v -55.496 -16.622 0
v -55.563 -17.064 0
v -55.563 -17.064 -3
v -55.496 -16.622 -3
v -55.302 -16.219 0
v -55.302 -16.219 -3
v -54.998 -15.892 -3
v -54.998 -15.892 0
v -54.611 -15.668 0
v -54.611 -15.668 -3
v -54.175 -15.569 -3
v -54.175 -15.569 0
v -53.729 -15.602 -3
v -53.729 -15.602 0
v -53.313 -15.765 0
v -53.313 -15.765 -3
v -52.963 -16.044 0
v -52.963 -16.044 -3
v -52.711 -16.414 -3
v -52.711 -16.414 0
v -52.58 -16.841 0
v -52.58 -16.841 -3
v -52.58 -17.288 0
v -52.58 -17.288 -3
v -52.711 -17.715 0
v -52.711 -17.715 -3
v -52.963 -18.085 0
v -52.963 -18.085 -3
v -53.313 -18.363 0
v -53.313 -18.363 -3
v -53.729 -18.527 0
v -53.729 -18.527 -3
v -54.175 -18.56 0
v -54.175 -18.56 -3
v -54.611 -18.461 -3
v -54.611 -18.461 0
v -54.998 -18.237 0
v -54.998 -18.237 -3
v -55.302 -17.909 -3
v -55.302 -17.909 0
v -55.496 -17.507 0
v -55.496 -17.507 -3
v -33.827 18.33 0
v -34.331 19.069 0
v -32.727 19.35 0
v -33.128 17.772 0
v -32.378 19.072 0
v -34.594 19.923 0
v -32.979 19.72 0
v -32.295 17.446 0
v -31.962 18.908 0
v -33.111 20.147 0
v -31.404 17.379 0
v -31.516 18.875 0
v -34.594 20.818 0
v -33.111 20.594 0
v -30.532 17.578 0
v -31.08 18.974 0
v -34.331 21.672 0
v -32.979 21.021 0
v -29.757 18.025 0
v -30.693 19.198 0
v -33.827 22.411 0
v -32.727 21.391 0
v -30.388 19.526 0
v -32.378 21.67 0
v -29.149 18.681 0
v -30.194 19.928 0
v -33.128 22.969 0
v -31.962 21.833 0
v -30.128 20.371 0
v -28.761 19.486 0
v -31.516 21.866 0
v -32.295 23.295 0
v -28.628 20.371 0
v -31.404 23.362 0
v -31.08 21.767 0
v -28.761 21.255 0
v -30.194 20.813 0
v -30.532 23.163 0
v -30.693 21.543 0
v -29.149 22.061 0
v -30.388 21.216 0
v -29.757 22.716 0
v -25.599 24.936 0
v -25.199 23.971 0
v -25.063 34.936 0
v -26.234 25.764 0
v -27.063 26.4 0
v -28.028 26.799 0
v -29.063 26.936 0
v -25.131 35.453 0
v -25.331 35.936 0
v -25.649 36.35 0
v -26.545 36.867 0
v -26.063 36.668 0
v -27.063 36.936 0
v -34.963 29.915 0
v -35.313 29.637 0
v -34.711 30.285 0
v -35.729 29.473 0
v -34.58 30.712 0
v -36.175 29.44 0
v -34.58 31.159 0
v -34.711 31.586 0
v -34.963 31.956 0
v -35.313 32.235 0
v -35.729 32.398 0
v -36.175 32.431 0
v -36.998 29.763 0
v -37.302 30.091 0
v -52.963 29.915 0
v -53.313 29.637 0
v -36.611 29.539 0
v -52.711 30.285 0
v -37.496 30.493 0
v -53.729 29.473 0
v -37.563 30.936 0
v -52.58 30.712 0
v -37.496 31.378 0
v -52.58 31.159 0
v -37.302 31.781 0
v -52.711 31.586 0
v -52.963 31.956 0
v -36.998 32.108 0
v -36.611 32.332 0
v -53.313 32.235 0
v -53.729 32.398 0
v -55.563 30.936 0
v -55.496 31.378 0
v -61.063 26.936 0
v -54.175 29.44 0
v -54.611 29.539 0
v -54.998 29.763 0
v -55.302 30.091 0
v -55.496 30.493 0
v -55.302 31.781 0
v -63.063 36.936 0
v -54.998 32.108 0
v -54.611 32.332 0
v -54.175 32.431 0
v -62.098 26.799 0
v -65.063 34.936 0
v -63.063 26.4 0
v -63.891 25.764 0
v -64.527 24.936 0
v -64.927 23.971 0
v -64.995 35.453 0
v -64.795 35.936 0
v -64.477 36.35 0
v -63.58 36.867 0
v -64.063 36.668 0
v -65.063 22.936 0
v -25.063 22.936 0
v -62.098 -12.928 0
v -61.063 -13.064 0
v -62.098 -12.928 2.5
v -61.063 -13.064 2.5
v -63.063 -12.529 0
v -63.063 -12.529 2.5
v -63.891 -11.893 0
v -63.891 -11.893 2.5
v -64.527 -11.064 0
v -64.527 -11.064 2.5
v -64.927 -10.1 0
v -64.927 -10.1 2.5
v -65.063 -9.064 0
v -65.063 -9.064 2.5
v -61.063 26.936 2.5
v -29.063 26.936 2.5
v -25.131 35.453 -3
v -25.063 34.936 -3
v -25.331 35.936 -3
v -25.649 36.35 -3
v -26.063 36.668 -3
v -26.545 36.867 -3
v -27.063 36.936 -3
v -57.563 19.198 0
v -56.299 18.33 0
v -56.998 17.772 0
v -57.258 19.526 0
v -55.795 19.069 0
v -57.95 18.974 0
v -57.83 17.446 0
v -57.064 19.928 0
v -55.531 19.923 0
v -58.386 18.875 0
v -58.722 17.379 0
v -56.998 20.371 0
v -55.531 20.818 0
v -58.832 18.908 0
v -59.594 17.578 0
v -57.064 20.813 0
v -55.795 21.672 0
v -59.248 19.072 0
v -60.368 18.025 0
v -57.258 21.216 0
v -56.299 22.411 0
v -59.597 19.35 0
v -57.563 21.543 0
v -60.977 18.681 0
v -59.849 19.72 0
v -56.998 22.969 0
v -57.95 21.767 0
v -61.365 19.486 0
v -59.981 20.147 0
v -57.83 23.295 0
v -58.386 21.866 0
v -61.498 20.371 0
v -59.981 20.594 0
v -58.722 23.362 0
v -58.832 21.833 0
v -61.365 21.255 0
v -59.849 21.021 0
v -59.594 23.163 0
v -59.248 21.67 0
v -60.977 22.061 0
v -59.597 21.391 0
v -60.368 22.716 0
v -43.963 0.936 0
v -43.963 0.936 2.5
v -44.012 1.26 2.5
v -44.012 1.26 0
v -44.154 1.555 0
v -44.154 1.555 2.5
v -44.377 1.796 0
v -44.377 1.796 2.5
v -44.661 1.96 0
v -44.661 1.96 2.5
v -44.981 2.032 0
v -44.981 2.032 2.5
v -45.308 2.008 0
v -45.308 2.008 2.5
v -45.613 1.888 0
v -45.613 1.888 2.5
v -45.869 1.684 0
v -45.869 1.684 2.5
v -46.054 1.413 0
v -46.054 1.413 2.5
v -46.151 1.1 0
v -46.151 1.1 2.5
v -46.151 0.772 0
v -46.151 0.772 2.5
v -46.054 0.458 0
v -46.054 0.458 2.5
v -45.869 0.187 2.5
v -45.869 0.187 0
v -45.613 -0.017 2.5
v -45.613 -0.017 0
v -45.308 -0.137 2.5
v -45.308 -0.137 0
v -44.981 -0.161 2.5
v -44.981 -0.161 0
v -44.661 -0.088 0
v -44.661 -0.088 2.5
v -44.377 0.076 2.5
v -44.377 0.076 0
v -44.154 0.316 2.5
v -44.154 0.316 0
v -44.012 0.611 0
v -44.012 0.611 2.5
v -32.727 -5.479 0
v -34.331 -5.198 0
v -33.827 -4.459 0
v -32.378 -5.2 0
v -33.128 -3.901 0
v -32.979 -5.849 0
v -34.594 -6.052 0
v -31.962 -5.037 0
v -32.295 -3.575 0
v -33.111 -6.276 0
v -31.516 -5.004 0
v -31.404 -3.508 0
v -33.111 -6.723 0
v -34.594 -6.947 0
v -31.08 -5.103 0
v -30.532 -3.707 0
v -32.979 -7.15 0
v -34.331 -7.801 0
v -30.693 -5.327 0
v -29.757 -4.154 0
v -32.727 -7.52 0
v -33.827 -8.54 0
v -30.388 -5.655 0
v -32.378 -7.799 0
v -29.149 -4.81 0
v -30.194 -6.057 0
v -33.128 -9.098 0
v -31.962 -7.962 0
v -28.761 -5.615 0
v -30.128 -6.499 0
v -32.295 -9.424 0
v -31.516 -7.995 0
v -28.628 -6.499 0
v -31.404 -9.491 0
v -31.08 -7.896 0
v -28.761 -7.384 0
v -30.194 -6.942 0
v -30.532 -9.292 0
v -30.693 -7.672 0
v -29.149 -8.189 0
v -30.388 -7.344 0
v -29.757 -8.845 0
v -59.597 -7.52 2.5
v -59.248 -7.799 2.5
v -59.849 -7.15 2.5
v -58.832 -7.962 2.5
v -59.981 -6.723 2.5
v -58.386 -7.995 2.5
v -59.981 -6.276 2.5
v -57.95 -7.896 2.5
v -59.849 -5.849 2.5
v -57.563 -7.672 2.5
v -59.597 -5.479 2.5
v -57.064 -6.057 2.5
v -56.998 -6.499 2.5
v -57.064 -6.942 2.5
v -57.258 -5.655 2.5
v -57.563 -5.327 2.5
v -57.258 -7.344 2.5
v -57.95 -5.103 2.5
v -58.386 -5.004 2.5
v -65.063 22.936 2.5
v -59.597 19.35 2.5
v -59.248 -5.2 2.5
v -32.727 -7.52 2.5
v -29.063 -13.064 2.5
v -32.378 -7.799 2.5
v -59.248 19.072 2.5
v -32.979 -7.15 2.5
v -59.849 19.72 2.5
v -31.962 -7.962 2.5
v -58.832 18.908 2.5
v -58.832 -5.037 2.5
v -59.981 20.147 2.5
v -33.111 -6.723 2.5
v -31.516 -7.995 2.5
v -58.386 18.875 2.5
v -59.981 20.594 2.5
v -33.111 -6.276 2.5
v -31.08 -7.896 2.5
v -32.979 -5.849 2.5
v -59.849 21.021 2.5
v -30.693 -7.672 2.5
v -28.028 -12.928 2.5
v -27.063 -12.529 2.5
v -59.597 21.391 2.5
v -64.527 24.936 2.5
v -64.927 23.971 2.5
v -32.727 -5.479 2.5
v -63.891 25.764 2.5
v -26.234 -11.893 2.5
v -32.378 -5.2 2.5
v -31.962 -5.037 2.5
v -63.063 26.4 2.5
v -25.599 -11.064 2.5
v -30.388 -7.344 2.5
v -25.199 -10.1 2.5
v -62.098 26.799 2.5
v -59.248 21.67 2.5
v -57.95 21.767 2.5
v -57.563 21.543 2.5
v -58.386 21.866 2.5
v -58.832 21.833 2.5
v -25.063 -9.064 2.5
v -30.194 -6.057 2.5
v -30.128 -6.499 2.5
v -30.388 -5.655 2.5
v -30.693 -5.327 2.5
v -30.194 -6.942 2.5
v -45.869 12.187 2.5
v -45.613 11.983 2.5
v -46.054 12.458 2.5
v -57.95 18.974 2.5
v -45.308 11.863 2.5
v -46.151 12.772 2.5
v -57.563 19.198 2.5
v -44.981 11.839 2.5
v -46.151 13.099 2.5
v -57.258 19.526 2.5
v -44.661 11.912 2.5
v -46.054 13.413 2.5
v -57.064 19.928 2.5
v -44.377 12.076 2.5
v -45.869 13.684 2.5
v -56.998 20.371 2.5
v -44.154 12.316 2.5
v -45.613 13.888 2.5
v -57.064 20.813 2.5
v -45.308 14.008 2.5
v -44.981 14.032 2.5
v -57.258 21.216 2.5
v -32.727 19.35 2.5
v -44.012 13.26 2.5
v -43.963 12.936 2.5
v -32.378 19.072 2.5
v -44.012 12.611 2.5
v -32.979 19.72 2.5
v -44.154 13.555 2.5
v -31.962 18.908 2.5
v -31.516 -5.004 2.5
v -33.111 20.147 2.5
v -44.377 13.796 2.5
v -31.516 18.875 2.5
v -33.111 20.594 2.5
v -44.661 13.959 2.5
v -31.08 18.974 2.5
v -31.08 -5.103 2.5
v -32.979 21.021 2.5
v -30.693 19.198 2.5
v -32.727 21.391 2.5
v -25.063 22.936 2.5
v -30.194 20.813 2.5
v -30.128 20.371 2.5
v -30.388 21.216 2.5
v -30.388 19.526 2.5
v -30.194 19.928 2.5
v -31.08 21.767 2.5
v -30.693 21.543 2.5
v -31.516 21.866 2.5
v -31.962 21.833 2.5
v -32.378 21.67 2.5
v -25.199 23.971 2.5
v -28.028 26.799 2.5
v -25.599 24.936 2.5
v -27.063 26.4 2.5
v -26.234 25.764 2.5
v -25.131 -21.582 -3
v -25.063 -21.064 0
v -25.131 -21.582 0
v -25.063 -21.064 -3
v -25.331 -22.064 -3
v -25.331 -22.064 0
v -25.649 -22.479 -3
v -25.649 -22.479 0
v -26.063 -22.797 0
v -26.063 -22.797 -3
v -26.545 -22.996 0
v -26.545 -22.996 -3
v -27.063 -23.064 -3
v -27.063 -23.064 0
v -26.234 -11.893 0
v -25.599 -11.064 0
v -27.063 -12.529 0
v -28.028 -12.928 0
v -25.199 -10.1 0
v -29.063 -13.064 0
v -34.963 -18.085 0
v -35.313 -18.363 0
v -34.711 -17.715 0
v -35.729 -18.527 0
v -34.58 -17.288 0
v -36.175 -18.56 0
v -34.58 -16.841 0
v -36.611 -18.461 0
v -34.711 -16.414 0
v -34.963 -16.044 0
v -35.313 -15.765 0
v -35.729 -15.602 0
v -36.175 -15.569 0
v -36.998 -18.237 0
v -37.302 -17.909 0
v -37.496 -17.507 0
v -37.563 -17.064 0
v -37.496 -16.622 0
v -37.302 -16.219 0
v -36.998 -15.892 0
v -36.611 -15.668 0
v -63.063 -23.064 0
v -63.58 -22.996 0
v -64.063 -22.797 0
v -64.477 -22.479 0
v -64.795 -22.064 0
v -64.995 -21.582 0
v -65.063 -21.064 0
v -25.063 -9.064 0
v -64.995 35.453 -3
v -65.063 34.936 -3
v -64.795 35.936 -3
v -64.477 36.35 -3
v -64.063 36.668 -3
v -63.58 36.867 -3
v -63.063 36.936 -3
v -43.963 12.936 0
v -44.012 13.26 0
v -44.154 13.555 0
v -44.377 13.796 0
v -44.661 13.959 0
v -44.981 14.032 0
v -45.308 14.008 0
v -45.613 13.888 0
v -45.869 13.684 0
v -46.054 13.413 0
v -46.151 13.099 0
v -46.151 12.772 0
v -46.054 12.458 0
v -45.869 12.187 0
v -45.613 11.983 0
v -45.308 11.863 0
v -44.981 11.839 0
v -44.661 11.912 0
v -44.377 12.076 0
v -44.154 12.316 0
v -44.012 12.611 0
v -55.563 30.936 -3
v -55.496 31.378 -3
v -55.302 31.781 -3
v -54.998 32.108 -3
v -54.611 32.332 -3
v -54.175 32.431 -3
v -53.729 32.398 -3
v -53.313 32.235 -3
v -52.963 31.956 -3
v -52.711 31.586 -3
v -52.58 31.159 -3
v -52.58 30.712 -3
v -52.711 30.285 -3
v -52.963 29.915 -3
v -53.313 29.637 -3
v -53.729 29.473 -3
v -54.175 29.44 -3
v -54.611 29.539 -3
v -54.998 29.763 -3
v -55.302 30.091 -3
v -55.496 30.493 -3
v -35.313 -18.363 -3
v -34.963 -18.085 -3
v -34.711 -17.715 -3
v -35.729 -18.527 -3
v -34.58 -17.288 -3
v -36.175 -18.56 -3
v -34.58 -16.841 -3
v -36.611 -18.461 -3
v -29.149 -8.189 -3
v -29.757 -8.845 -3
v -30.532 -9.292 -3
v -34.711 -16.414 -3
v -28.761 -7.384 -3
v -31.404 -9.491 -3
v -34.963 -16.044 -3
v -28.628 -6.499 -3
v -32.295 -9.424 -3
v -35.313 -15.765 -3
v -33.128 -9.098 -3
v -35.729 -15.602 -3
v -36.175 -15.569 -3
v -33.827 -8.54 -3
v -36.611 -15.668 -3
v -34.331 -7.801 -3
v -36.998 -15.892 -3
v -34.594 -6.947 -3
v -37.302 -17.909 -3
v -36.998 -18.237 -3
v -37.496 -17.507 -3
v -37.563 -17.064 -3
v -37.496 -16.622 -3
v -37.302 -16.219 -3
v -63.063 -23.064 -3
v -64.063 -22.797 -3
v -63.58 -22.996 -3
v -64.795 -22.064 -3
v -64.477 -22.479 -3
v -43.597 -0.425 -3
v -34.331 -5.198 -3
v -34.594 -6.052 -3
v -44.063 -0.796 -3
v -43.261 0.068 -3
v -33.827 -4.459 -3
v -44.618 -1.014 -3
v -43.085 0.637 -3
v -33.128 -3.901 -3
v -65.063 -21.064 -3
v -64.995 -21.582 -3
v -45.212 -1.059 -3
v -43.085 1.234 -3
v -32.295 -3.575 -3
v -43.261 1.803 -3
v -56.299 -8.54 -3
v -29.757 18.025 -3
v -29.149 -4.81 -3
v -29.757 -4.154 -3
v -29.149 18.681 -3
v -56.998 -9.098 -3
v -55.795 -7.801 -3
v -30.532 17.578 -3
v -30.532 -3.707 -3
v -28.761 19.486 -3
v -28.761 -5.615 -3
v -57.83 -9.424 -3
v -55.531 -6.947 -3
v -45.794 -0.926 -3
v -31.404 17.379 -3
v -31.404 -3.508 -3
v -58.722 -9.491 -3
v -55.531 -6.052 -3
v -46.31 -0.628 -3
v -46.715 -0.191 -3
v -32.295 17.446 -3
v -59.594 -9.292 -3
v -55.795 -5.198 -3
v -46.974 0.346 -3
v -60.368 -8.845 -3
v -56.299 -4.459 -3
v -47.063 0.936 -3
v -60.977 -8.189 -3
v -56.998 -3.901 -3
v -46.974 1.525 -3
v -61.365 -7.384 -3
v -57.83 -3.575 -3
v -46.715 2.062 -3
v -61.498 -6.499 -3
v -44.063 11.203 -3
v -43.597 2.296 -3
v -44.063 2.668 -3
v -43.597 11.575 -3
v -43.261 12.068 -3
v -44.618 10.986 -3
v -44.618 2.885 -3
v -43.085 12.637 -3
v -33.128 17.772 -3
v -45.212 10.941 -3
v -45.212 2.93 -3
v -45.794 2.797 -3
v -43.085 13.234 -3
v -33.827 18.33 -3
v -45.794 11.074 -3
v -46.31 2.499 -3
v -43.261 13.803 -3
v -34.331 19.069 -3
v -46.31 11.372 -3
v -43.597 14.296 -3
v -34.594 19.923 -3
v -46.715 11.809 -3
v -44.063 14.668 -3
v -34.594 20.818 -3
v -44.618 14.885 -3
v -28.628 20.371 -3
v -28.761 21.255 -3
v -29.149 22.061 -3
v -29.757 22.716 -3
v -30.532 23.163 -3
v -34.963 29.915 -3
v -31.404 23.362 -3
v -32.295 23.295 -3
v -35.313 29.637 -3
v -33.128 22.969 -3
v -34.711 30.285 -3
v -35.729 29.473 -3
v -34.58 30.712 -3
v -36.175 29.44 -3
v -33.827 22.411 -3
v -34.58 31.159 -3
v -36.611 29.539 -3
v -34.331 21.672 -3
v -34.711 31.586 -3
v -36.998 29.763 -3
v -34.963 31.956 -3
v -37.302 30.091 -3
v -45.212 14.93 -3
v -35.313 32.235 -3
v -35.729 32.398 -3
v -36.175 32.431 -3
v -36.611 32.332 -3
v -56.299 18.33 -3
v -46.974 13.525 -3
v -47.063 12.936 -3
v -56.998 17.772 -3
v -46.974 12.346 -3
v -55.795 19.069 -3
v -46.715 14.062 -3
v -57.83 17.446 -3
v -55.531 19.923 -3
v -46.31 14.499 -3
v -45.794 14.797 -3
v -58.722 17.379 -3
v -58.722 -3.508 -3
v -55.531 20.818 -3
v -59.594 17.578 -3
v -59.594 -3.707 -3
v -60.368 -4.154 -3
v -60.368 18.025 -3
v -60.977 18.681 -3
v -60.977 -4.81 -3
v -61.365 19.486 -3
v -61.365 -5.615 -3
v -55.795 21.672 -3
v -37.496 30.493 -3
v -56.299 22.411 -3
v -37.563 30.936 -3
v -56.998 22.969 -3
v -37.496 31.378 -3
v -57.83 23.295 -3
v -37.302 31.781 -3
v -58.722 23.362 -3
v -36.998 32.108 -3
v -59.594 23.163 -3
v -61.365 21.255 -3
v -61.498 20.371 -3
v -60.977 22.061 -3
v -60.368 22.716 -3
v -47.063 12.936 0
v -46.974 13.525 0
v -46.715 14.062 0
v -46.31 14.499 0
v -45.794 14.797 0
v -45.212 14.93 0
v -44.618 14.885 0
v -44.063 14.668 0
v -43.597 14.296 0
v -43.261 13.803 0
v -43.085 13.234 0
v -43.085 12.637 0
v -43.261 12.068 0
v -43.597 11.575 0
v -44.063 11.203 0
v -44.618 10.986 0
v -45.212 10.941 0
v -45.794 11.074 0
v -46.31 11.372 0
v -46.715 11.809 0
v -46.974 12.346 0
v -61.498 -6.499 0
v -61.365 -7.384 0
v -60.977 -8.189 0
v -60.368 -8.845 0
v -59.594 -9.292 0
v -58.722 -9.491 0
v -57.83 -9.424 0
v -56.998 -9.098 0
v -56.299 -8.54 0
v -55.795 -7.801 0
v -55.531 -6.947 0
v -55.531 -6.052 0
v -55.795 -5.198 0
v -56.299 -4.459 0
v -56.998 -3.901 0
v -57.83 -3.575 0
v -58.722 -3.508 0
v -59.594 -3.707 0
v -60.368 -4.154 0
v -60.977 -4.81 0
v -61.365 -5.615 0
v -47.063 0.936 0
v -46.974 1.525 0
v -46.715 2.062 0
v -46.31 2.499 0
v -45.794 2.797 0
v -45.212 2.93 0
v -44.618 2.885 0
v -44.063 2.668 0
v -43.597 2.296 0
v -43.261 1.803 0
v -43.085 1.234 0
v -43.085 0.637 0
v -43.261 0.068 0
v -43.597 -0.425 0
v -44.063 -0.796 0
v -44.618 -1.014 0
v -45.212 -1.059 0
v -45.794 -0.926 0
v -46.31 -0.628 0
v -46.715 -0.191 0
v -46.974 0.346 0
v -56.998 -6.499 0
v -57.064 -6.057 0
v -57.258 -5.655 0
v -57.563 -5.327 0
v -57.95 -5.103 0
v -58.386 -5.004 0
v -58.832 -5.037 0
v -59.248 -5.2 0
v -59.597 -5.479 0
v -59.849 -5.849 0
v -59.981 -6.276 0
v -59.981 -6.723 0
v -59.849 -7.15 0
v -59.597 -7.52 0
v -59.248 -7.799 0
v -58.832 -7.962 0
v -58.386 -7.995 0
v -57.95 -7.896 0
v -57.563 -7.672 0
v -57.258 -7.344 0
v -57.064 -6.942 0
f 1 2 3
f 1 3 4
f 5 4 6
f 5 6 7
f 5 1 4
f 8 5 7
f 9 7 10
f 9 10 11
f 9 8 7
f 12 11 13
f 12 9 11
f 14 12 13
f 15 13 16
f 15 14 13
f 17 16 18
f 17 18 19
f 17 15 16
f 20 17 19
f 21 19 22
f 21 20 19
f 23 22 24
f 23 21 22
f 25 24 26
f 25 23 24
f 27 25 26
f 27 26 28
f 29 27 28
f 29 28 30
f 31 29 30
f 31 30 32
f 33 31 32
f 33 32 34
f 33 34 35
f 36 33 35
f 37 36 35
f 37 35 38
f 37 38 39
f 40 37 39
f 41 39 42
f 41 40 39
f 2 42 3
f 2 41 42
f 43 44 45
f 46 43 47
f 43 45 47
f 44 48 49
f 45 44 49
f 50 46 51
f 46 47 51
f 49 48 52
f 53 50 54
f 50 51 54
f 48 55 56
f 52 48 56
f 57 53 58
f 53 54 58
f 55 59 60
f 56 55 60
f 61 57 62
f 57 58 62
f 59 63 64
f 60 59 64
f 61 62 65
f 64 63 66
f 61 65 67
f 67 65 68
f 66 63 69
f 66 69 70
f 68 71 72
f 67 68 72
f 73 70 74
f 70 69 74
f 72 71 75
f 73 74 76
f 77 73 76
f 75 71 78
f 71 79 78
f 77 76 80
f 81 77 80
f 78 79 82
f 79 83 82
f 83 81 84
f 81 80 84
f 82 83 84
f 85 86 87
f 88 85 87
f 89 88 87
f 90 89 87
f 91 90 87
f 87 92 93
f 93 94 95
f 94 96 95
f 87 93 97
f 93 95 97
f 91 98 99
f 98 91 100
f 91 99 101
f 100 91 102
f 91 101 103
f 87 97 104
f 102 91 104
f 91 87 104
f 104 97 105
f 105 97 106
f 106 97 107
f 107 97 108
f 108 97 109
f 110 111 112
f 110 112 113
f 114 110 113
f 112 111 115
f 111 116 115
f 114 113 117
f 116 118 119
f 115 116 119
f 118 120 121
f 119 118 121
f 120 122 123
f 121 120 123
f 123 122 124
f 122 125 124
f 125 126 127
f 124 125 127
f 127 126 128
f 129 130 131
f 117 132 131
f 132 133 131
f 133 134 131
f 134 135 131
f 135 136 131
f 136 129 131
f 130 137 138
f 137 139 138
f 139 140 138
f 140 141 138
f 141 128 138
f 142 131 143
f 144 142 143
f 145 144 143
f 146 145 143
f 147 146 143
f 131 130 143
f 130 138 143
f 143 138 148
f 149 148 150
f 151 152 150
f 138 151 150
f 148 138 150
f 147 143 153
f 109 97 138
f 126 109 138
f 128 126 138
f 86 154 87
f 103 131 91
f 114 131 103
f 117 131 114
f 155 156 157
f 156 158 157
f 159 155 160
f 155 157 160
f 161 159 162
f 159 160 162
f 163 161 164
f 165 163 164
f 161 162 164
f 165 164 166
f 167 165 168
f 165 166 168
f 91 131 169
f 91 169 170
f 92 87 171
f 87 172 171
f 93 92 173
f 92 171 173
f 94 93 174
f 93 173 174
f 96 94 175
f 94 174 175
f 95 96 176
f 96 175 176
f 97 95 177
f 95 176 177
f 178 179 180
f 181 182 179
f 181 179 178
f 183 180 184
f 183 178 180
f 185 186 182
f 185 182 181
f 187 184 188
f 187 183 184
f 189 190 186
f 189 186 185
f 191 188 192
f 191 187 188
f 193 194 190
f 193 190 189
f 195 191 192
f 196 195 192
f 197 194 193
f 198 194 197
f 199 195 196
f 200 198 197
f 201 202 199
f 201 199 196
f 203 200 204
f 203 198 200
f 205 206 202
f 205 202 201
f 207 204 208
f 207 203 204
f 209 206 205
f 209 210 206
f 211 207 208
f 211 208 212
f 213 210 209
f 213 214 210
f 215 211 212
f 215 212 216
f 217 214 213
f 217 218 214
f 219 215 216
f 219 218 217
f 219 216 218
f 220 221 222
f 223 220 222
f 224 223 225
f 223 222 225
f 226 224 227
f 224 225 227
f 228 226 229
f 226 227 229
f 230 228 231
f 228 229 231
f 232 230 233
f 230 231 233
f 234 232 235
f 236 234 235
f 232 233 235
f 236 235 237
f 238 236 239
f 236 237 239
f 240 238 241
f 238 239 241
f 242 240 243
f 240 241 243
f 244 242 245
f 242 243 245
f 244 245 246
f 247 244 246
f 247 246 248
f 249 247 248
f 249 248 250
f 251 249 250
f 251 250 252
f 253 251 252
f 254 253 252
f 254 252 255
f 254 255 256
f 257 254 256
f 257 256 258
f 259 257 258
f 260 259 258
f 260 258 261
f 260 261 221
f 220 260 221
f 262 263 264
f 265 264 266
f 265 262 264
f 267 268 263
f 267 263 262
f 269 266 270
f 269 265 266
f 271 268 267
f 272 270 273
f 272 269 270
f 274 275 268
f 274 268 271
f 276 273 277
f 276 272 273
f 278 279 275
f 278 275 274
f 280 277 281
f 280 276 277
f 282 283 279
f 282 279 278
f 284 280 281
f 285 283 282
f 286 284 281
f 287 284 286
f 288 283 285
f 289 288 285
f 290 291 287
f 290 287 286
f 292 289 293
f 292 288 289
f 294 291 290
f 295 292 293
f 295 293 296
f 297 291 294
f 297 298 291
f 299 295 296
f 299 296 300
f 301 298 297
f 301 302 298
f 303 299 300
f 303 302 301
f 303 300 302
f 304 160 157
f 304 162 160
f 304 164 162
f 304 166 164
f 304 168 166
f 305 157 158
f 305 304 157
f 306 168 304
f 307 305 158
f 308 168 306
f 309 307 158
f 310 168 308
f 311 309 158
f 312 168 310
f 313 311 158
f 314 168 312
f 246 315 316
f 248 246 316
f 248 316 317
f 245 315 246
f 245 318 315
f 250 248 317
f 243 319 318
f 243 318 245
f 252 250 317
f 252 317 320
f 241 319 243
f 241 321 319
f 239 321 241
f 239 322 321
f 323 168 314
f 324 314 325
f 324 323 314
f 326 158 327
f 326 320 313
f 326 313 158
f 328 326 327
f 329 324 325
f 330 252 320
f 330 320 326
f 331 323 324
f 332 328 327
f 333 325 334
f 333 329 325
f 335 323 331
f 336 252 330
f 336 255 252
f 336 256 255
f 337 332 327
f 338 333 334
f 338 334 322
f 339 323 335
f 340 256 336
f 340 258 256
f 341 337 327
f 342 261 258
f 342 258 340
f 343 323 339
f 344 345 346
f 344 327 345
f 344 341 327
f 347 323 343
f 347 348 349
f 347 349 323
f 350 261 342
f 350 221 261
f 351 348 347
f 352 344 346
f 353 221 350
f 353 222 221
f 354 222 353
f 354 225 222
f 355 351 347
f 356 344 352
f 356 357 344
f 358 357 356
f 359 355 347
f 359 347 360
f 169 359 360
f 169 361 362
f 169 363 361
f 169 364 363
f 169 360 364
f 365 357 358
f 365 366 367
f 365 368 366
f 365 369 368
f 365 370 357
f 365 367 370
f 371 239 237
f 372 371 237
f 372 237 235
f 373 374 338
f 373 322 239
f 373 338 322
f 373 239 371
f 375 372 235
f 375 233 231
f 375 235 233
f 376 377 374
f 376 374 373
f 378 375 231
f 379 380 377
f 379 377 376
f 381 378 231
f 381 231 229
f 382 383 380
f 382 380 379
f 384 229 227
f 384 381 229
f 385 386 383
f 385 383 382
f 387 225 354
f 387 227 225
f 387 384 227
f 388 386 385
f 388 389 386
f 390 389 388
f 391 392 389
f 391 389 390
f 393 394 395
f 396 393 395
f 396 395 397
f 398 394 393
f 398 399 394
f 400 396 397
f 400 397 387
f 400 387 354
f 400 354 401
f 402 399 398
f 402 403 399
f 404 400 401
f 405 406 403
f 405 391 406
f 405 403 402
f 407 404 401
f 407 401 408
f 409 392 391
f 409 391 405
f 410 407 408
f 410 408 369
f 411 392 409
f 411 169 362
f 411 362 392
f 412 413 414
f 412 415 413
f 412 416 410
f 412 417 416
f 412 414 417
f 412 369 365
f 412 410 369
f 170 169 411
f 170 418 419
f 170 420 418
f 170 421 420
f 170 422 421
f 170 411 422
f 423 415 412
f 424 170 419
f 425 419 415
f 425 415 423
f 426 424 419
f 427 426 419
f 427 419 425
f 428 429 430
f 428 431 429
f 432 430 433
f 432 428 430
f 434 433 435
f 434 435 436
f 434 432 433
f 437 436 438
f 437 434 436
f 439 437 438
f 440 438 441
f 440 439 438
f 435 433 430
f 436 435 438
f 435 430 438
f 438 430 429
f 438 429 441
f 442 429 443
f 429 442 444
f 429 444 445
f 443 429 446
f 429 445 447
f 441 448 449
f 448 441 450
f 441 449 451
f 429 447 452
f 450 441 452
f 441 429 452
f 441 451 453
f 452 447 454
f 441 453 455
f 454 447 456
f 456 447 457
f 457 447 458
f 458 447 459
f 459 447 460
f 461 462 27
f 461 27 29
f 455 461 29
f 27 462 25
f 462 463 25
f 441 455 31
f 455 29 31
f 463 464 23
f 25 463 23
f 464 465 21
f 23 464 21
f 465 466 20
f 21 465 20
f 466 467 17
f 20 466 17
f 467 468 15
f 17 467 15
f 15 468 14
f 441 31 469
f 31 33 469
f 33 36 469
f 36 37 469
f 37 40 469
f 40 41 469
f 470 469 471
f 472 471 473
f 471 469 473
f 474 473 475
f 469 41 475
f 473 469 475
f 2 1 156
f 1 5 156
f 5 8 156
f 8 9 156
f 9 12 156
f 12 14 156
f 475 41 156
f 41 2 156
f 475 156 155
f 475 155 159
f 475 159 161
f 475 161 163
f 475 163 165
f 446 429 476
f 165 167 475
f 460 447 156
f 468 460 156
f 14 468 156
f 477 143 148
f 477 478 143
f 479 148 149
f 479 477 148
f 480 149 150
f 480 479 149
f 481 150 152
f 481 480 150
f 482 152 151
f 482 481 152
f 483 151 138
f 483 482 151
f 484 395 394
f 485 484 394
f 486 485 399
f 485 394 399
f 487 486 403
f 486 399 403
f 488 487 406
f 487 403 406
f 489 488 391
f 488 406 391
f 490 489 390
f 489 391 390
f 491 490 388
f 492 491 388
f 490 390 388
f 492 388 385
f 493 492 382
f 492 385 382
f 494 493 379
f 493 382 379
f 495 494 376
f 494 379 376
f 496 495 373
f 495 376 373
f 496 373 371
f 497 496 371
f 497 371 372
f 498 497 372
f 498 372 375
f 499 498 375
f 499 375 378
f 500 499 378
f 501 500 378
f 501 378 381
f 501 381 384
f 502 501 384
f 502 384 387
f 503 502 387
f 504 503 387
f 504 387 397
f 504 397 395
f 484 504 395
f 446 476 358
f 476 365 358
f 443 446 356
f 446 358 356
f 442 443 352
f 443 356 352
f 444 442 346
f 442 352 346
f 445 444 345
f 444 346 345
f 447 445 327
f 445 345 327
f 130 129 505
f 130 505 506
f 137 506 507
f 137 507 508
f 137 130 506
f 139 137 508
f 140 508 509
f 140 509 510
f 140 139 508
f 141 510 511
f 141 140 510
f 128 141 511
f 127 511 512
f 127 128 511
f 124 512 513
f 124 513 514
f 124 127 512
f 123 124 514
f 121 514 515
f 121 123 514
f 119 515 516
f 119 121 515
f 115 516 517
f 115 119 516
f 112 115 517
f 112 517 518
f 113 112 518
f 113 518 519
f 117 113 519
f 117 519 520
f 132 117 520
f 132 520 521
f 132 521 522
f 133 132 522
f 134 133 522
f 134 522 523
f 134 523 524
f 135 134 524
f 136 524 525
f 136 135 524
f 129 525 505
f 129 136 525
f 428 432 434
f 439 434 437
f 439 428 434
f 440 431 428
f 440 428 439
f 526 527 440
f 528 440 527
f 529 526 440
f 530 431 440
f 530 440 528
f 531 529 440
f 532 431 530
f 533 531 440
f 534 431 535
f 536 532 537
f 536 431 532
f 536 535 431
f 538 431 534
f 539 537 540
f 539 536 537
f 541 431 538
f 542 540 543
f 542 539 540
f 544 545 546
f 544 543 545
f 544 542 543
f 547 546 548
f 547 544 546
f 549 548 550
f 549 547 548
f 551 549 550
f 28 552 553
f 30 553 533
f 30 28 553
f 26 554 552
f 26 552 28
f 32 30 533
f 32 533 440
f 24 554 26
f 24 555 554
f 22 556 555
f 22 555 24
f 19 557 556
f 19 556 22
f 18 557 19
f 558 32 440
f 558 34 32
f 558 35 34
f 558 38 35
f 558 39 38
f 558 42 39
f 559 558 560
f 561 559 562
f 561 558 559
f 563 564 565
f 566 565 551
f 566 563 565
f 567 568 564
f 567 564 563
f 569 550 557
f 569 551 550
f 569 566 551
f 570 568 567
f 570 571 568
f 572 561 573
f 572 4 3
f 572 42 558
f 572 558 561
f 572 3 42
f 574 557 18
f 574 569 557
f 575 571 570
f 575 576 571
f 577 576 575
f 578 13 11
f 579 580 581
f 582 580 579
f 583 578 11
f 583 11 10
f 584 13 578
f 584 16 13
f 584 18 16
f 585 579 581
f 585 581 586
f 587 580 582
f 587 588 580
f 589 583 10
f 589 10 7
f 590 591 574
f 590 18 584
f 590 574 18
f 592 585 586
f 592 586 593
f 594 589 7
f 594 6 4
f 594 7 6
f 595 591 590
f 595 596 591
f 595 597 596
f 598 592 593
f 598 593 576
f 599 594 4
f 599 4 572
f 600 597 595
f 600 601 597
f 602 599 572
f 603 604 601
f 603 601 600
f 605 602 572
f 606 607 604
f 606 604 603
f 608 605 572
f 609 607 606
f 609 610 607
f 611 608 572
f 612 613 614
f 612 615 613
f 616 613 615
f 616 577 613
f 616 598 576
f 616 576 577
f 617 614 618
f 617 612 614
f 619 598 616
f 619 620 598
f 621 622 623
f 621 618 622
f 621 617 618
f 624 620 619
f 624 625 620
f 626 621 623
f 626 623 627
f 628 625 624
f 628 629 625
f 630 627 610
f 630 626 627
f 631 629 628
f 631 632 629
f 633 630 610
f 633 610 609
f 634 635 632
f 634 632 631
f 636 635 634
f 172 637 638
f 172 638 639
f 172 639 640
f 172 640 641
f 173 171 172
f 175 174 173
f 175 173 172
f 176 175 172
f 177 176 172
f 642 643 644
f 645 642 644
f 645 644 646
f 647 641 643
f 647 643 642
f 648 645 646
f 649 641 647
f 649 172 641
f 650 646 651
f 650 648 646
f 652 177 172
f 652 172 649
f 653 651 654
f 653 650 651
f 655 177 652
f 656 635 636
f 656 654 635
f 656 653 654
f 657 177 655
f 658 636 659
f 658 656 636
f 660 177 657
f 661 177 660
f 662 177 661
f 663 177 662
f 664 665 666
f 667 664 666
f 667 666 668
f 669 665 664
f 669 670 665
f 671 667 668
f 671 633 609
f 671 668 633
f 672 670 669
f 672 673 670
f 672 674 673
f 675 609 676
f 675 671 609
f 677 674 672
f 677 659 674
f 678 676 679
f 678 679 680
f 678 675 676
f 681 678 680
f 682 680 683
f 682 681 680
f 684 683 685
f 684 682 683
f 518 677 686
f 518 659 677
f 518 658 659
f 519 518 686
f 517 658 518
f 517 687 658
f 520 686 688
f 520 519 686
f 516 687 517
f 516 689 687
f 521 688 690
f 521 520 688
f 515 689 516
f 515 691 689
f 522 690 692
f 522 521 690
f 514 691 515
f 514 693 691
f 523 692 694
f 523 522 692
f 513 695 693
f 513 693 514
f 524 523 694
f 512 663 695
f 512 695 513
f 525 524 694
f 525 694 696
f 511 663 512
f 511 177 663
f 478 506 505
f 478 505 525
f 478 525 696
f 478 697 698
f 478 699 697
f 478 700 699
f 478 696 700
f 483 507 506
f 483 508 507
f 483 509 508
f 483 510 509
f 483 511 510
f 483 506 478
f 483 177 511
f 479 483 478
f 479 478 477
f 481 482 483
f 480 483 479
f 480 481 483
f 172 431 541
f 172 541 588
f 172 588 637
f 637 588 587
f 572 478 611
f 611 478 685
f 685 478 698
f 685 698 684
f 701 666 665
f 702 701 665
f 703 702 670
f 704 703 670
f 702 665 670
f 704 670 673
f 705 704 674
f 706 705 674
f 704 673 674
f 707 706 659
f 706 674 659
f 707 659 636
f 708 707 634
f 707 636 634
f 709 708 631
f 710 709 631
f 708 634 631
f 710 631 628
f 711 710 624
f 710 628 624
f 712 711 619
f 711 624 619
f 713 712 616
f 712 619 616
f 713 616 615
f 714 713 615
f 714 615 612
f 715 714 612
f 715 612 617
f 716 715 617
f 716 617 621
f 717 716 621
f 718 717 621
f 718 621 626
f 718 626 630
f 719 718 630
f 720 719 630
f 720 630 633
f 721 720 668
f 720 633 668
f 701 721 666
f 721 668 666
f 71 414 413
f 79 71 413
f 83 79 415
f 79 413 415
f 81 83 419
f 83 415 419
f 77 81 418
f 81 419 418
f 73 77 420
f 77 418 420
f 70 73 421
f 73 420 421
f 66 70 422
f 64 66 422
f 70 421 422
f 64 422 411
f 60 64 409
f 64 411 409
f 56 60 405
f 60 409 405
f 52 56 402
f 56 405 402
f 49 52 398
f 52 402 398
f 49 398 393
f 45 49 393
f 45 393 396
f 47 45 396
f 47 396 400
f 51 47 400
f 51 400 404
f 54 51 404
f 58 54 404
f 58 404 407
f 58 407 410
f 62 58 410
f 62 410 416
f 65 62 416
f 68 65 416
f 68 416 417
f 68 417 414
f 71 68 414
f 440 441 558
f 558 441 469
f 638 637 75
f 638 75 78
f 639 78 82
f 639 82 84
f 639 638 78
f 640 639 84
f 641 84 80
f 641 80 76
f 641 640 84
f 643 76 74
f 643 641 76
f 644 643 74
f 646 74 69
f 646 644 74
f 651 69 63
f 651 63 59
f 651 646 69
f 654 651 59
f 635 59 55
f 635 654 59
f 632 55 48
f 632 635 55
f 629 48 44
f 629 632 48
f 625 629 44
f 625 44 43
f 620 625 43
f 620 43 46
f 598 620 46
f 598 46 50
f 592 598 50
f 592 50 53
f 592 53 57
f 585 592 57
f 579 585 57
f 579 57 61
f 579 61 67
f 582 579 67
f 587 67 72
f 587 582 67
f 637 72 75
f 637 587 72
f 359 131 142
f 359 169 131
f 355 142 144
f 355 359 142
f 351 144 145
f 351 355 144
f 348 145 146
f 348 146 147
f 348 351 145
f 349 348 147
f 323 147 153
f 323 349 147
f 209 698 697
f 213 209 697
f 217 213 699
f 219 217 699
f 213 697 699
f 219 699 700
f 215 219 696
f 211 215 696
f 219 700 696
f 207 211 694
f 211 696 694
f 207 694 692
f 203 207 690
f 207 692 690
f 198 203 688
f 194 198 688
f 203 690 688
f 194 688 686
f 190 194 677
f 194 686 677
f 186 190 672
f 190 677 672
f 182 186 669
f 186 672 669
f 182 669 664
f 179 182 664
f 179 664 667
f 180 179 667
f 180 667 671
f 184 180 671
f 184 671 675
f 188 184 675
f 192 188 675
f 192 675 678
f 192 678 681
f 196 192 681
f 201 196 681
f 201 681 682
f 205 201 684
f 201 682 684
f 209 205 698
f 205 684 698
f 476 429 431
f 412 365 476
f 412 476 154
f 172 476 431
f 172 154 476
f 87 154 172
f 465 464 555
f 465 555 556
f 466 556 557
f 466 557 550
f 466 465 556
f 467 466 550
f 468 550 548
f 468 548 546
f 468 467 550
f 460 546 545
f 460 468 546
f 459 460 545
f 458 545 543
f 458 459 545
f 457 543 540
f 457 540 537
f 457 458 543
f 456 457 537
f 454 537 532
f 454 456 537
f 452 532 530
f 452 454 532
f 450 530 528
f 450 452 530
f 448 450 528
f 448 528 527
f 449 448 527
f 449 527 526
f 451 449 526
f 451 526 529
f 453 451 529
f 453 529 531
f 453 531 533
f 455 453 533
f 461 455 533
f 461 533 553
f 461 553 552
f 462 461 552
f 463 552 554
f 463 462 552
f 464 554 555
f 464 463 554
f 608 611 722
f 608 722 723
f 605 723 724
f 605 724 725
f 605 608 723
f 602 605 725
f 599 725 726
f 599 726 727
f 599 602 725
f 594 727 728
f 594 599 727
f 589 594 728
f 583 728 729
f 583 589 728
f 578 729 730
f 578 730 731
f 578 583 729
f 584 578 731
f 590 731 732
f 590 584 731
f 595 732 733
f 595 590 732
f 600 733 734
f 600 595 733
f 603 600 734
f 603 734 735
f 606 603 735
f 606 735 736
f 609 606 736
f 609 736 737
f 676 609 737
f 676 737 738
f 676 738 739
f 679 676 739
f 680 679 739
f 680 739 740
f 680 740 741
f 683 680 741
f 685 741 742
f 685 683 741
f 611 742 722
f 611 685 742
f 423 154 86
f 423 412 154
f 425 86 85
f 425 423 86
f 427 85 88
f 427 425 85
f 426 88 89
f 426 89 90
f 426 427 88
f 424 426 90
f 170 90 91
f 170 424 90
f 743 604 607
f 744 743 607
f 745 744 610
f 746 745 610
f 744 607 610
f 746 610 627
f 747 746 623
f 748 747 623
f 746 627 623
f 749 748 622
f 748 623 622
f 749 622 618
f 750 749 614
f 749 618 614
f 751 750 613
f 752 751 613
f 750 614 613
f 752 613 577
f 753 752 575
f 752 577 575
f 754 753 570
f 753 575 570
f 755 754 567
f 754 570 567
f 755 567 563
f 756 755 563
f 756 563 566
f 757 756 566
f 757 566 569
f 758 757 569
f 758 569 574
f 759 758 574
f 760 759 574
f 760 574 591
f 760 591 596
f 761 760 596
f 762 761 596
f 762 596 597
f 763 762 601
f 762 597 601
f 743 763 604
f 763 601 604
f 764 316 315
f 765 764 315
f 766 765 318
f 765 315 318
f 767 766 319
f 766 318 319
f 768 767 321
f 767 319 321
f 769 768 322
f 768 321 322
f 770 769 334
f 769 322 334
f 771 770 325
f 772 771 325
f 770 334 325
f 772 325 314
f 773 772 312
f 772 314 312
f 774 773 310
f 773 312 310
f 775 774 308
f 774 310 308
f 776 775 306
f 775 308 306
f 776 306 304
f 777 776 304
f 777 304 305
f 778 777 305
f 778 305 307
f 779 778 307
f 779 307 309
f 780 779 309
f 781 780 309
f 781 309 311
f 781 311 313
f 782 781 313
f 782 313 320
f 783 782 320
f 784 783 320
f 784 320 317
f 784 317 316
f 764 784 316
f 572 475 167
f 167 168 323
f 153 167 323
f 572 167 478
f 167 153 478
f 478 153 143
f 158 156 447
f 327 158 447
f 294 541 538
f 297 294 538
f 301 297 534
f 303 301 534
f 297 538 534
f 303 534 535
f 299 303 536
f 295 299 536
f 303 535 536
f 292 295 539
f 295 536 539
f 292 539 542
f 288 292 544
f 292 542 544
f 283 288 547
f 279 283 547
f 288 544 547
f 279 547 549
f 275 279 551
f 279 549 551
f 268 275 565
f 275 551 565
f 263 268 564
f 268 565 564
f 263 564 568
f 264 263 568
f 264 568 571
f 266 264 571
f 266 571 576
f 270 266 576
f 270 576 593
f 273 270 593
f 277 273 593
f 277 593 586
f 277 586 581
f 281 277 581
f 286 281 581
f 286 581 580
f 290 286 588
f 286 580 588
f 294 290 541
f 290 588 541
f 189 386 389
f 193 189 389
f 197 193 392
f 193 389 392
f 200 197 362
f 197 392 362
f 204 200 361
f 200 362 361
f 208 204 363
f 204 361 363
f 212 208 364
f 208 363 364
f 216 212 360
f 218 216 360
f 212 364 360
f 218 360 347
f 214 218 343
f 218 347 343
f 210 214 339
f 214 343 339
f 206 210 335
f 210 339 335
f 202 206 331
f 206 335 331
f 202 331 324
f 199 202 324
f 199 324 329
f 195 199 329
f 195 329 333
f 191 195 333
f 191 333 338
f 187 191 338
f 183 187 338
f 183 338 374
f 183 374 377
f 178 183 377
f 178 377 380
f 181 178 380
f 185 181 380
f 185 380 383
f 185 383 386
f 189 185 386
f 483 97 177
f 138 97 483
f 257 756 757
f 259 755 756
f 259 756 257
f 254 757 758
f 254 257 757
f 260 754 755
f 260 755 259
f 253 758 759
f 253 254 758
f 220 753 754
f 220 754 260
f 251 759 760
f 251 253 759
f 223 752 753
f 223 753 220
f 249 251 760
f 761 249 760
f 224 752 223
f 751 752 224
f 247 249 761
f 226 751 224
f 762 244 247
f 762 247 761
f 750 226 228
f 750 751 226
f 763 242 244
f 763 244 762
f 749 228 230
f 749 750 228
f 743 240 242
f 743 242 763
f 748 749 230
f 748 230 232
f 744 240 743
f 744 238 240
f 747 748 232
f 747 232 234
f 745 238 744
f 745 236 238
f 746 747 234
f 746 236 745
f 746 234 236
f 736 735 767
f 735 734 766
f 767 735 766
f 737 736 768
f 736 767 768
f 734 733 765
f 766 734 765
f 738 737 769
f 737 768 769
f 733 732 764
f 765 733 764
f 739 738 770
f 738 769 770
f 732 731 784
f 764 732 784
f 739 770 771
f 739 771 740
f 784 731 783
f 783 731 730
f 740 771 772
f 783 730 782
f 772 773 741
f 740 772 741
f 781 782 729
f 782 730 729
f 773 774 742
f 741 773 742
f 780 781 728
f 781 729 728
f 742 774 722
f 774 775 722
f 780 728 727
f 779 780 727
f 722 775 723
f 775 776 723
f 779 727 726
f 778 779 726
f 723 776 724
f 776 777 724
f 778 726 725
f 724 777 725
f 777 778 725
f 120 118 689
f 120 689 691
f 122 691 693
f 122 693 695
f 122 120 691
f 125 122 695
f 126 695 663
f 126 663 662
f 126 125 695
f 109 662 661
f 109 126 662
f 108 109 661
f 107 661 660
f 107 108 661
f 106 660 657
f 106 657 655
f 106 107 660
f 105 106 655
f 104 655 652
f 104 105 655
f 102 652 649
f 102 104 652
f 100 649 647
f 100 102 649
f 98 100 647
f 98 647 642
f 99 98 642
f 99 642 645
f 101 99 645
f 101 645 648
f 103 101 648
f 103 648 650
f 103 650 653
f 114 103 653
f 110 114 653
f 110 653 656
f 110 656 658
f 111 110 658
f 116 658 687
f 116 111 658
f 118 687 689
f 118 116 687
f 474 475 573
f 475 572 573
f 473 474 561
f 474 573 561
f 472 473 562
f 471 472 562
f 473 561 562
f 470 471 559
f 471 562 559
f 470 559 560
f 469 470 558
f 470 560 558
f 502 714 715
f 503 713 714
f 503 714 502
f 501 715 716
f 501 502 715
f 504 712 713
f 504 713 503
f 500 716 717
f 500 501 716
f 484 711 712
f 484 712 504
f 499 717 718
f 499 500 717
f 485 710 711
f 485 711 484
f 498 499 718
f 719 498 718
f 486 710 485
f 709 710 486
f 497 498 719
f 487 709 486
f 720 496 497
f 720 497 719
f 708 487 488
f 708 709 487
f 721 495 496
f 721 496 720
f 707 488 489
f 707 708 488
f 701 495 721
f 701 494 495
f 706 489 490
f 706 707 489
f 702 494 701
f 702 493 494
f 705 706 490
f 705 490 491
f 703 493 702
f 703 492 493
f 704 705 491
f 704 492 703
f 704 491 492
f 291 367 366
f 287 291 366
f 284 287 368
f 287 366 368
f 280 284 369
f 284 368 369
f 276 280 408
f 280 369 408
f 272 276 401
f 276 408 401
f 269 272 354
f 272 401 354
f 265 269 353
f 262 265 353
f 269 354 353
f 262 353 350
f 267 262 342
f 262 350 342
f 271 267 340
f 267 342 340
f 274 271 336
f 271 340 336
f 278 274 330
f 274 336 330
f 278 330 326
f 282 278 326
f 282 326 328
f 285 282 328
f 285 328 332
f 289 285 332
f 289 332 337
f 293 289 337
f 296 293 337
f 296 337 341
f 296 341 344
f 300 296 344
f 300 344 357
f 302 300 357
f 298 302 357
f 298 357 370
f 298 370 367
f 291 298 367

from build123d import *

# Parameters (mm, degrees)
SKETCH_2_W               = 40
SKETCH_2_H               = 40
EXTRUDE_1_DEPTH          = 2.5
SKETCH_5_W               = 40
SKETCH_5_H               = 60
SKETCH_5_R               = 1.5
EXTRUDE_2_DEPTH          = 3
SKETCH_4_R               = 1.5
SKETCH_4_R_2             = 1.10000034
CUT_EXTRUDE_1_DEPTH      = 6.5
FILLET_1_R               = 4
FILLET_5_R               = 2
SKETCH_6_R               = 3
CUT_EXTRUDE_2_DEPTH      = 3
MIRROR_2_COPY_1_SKETCH_R = 3
MIRROR_2_COPY_1_DEPTH    = 3
SKETCH_7_R               = 2
CUT_EXTRUDE_3_DEPTH      = 3


with BuildPart() as part:
    # 草图2 → 凸台-拉伸1 (new body)
    with BuildSketch(Plane.XY):
        with Locations((-45.062828034, 6.935543198)):
            Rectangle(SKETCH_2_W, SKETCH_2_H)
    extrude(amount=EXTRUDE_1_DEPTH)

    # 草图5 → 凸台-拉伸2 (add)
    with BuildSketch(Plane(origin=(0, 0, 0), x_dir=(-1, 0, 0), z_dir=(0, 0, -1))):
        with Locations((45.062828034, 6.935543198)):
            Rectangle(SKETCH_5_W, SKETCH_5_H)
        with Locations((36.062828034, 30.935543198)):
            Circle(SKETCH_5_R, mode=Mode.SUBTRACT)
        with Locations((54.062828034, 30.935543198)):
            Circle(SKETCH_5_R, mode=Mode.SUBTRACT)
        with Locations((54.062828034, -17.064456802)):
            Circle(SKETCH_5_R, mode=Mode.SUBTRACT)
        with Locations((36.062828034, -17.064456802)):
            Circle(SKETCH_5_R, mode=Mode.SUBTRACT)
    extrude(amount=EXTRUDE_2_DEPTH)

    # 草图4 → 切除-拉伸1 (cut, through all)
    with BuildSketch(Plane.XY.offset(2.5)):
        with Locations((-31.627799192, 20.370572041)):
            Circle(SKETCH_4_R)
        with Locations((-58.497856877, 20.370572041)):
            Circle(SKETCH_4_R)
        with Locations((-58.497856877, -6.499485644)):
            Circle(SKETCH_4_R)
        with Locations((-31.627799192, -6.499485644)):
            Circle(SKETCH_4_R)
        with Locations((-45.062828034, 12.935531198)):
            Circle(SKETCH_4_R_2)
        with Locations((-45.062828034, 0.935555198)):
            Circle(SKETCH_4_R_2)
    extrude(amount=-CUT_EXTRUDE_1_DEPTH, mode=Mode.SUBTRACT)

    # 圆角1
    fillet_1_edges = [part.edges().sort_by_distance(p)[0] for p in [
        (-25.062828034, -13.064456802, 1.25),
        (-65.062828034, -13.064456802, 1.25),
        (-65.062828034, 26.935543198, 1.25),
        (-25.062828034, 26.935543198, 1.25),
    ]]
    fillet(fillet_1_edges, radius=FILLET_1_R)

    # 圆角5
    fillet_5_edges = [part.edges().sort_by_distance(p)[0] for p in [
        (-25.062828034, 36.935543198, -1.5),
        (-25.062828034, -23.064456802, -1.5),
        (-65.062828034, -23.064456802, -1.5),
        (-65.062828034, 36.935543198, -1.5),
    ]]
    fillet(fillet_5_edges, radius=FILLET_5_R)

    # 草图6 → 切除-拉伸2 (cut)
    with BuildSketch(Plane(origin=(0, 0, -3), x_dir=(-1, 0, 0), z_dir=(0, 0, -1))):
        with Locations((58.497856877, 20.370572041)):
            Circle(SKETCH_6_R)
    cut_extrude_2 = extrude(amount=-CUT_EXTRUDE_2_DEPTH, mode=Mode.SUBTRACT)

    # 镜向1: 切除-拉伸2 across plane
    add(cut_extrude_2.mirror(Plane.ZX.offset(6.935543198)), mode=Mode.SUBTRACT)

    # 镜向2: 切除-拉伸2 across plane
    add(cut_extrude_2.mirror(Plane.ZY.offset(45.062828034)), mode=Mode.SUBTRACT)

    # 镜向2 copy 1 sketch → 镜向2 copy 1 (cut)
    with BuildSketch(Plane(origin=(-90.125656068, 13.871086397, -3), x_dir=(1, 0, 0), z_dir=(0, 0, -1))):
        with Locations((58.497856877, 20.370572041)):
            Circle(MIRROR_2_COPY_1_SKETCH_R)
    extrude(amount=-MIRROR_2_COPY_1_DEPTH, mode=Mode.SUBTRACT)

    # 草图7 → 切除-拉伸3 (cut)
    with BuildSketch(Plane(origin=(0, 0, -3), x_dir=(-1, 0, 0), z_dir=(0, 0, -1))):
        with Locations((45.062828034, 12.935531198)):
            Circle(SKETCH_7_R)
        with Locations((45.062828034, 0.935555198)):
            Circle(SKETCH_7_R)
    extrude(amount=-CUT_EXTRUDE_3_DEPTH, mode=Mode.SUBTRACT)


solid = part.part
